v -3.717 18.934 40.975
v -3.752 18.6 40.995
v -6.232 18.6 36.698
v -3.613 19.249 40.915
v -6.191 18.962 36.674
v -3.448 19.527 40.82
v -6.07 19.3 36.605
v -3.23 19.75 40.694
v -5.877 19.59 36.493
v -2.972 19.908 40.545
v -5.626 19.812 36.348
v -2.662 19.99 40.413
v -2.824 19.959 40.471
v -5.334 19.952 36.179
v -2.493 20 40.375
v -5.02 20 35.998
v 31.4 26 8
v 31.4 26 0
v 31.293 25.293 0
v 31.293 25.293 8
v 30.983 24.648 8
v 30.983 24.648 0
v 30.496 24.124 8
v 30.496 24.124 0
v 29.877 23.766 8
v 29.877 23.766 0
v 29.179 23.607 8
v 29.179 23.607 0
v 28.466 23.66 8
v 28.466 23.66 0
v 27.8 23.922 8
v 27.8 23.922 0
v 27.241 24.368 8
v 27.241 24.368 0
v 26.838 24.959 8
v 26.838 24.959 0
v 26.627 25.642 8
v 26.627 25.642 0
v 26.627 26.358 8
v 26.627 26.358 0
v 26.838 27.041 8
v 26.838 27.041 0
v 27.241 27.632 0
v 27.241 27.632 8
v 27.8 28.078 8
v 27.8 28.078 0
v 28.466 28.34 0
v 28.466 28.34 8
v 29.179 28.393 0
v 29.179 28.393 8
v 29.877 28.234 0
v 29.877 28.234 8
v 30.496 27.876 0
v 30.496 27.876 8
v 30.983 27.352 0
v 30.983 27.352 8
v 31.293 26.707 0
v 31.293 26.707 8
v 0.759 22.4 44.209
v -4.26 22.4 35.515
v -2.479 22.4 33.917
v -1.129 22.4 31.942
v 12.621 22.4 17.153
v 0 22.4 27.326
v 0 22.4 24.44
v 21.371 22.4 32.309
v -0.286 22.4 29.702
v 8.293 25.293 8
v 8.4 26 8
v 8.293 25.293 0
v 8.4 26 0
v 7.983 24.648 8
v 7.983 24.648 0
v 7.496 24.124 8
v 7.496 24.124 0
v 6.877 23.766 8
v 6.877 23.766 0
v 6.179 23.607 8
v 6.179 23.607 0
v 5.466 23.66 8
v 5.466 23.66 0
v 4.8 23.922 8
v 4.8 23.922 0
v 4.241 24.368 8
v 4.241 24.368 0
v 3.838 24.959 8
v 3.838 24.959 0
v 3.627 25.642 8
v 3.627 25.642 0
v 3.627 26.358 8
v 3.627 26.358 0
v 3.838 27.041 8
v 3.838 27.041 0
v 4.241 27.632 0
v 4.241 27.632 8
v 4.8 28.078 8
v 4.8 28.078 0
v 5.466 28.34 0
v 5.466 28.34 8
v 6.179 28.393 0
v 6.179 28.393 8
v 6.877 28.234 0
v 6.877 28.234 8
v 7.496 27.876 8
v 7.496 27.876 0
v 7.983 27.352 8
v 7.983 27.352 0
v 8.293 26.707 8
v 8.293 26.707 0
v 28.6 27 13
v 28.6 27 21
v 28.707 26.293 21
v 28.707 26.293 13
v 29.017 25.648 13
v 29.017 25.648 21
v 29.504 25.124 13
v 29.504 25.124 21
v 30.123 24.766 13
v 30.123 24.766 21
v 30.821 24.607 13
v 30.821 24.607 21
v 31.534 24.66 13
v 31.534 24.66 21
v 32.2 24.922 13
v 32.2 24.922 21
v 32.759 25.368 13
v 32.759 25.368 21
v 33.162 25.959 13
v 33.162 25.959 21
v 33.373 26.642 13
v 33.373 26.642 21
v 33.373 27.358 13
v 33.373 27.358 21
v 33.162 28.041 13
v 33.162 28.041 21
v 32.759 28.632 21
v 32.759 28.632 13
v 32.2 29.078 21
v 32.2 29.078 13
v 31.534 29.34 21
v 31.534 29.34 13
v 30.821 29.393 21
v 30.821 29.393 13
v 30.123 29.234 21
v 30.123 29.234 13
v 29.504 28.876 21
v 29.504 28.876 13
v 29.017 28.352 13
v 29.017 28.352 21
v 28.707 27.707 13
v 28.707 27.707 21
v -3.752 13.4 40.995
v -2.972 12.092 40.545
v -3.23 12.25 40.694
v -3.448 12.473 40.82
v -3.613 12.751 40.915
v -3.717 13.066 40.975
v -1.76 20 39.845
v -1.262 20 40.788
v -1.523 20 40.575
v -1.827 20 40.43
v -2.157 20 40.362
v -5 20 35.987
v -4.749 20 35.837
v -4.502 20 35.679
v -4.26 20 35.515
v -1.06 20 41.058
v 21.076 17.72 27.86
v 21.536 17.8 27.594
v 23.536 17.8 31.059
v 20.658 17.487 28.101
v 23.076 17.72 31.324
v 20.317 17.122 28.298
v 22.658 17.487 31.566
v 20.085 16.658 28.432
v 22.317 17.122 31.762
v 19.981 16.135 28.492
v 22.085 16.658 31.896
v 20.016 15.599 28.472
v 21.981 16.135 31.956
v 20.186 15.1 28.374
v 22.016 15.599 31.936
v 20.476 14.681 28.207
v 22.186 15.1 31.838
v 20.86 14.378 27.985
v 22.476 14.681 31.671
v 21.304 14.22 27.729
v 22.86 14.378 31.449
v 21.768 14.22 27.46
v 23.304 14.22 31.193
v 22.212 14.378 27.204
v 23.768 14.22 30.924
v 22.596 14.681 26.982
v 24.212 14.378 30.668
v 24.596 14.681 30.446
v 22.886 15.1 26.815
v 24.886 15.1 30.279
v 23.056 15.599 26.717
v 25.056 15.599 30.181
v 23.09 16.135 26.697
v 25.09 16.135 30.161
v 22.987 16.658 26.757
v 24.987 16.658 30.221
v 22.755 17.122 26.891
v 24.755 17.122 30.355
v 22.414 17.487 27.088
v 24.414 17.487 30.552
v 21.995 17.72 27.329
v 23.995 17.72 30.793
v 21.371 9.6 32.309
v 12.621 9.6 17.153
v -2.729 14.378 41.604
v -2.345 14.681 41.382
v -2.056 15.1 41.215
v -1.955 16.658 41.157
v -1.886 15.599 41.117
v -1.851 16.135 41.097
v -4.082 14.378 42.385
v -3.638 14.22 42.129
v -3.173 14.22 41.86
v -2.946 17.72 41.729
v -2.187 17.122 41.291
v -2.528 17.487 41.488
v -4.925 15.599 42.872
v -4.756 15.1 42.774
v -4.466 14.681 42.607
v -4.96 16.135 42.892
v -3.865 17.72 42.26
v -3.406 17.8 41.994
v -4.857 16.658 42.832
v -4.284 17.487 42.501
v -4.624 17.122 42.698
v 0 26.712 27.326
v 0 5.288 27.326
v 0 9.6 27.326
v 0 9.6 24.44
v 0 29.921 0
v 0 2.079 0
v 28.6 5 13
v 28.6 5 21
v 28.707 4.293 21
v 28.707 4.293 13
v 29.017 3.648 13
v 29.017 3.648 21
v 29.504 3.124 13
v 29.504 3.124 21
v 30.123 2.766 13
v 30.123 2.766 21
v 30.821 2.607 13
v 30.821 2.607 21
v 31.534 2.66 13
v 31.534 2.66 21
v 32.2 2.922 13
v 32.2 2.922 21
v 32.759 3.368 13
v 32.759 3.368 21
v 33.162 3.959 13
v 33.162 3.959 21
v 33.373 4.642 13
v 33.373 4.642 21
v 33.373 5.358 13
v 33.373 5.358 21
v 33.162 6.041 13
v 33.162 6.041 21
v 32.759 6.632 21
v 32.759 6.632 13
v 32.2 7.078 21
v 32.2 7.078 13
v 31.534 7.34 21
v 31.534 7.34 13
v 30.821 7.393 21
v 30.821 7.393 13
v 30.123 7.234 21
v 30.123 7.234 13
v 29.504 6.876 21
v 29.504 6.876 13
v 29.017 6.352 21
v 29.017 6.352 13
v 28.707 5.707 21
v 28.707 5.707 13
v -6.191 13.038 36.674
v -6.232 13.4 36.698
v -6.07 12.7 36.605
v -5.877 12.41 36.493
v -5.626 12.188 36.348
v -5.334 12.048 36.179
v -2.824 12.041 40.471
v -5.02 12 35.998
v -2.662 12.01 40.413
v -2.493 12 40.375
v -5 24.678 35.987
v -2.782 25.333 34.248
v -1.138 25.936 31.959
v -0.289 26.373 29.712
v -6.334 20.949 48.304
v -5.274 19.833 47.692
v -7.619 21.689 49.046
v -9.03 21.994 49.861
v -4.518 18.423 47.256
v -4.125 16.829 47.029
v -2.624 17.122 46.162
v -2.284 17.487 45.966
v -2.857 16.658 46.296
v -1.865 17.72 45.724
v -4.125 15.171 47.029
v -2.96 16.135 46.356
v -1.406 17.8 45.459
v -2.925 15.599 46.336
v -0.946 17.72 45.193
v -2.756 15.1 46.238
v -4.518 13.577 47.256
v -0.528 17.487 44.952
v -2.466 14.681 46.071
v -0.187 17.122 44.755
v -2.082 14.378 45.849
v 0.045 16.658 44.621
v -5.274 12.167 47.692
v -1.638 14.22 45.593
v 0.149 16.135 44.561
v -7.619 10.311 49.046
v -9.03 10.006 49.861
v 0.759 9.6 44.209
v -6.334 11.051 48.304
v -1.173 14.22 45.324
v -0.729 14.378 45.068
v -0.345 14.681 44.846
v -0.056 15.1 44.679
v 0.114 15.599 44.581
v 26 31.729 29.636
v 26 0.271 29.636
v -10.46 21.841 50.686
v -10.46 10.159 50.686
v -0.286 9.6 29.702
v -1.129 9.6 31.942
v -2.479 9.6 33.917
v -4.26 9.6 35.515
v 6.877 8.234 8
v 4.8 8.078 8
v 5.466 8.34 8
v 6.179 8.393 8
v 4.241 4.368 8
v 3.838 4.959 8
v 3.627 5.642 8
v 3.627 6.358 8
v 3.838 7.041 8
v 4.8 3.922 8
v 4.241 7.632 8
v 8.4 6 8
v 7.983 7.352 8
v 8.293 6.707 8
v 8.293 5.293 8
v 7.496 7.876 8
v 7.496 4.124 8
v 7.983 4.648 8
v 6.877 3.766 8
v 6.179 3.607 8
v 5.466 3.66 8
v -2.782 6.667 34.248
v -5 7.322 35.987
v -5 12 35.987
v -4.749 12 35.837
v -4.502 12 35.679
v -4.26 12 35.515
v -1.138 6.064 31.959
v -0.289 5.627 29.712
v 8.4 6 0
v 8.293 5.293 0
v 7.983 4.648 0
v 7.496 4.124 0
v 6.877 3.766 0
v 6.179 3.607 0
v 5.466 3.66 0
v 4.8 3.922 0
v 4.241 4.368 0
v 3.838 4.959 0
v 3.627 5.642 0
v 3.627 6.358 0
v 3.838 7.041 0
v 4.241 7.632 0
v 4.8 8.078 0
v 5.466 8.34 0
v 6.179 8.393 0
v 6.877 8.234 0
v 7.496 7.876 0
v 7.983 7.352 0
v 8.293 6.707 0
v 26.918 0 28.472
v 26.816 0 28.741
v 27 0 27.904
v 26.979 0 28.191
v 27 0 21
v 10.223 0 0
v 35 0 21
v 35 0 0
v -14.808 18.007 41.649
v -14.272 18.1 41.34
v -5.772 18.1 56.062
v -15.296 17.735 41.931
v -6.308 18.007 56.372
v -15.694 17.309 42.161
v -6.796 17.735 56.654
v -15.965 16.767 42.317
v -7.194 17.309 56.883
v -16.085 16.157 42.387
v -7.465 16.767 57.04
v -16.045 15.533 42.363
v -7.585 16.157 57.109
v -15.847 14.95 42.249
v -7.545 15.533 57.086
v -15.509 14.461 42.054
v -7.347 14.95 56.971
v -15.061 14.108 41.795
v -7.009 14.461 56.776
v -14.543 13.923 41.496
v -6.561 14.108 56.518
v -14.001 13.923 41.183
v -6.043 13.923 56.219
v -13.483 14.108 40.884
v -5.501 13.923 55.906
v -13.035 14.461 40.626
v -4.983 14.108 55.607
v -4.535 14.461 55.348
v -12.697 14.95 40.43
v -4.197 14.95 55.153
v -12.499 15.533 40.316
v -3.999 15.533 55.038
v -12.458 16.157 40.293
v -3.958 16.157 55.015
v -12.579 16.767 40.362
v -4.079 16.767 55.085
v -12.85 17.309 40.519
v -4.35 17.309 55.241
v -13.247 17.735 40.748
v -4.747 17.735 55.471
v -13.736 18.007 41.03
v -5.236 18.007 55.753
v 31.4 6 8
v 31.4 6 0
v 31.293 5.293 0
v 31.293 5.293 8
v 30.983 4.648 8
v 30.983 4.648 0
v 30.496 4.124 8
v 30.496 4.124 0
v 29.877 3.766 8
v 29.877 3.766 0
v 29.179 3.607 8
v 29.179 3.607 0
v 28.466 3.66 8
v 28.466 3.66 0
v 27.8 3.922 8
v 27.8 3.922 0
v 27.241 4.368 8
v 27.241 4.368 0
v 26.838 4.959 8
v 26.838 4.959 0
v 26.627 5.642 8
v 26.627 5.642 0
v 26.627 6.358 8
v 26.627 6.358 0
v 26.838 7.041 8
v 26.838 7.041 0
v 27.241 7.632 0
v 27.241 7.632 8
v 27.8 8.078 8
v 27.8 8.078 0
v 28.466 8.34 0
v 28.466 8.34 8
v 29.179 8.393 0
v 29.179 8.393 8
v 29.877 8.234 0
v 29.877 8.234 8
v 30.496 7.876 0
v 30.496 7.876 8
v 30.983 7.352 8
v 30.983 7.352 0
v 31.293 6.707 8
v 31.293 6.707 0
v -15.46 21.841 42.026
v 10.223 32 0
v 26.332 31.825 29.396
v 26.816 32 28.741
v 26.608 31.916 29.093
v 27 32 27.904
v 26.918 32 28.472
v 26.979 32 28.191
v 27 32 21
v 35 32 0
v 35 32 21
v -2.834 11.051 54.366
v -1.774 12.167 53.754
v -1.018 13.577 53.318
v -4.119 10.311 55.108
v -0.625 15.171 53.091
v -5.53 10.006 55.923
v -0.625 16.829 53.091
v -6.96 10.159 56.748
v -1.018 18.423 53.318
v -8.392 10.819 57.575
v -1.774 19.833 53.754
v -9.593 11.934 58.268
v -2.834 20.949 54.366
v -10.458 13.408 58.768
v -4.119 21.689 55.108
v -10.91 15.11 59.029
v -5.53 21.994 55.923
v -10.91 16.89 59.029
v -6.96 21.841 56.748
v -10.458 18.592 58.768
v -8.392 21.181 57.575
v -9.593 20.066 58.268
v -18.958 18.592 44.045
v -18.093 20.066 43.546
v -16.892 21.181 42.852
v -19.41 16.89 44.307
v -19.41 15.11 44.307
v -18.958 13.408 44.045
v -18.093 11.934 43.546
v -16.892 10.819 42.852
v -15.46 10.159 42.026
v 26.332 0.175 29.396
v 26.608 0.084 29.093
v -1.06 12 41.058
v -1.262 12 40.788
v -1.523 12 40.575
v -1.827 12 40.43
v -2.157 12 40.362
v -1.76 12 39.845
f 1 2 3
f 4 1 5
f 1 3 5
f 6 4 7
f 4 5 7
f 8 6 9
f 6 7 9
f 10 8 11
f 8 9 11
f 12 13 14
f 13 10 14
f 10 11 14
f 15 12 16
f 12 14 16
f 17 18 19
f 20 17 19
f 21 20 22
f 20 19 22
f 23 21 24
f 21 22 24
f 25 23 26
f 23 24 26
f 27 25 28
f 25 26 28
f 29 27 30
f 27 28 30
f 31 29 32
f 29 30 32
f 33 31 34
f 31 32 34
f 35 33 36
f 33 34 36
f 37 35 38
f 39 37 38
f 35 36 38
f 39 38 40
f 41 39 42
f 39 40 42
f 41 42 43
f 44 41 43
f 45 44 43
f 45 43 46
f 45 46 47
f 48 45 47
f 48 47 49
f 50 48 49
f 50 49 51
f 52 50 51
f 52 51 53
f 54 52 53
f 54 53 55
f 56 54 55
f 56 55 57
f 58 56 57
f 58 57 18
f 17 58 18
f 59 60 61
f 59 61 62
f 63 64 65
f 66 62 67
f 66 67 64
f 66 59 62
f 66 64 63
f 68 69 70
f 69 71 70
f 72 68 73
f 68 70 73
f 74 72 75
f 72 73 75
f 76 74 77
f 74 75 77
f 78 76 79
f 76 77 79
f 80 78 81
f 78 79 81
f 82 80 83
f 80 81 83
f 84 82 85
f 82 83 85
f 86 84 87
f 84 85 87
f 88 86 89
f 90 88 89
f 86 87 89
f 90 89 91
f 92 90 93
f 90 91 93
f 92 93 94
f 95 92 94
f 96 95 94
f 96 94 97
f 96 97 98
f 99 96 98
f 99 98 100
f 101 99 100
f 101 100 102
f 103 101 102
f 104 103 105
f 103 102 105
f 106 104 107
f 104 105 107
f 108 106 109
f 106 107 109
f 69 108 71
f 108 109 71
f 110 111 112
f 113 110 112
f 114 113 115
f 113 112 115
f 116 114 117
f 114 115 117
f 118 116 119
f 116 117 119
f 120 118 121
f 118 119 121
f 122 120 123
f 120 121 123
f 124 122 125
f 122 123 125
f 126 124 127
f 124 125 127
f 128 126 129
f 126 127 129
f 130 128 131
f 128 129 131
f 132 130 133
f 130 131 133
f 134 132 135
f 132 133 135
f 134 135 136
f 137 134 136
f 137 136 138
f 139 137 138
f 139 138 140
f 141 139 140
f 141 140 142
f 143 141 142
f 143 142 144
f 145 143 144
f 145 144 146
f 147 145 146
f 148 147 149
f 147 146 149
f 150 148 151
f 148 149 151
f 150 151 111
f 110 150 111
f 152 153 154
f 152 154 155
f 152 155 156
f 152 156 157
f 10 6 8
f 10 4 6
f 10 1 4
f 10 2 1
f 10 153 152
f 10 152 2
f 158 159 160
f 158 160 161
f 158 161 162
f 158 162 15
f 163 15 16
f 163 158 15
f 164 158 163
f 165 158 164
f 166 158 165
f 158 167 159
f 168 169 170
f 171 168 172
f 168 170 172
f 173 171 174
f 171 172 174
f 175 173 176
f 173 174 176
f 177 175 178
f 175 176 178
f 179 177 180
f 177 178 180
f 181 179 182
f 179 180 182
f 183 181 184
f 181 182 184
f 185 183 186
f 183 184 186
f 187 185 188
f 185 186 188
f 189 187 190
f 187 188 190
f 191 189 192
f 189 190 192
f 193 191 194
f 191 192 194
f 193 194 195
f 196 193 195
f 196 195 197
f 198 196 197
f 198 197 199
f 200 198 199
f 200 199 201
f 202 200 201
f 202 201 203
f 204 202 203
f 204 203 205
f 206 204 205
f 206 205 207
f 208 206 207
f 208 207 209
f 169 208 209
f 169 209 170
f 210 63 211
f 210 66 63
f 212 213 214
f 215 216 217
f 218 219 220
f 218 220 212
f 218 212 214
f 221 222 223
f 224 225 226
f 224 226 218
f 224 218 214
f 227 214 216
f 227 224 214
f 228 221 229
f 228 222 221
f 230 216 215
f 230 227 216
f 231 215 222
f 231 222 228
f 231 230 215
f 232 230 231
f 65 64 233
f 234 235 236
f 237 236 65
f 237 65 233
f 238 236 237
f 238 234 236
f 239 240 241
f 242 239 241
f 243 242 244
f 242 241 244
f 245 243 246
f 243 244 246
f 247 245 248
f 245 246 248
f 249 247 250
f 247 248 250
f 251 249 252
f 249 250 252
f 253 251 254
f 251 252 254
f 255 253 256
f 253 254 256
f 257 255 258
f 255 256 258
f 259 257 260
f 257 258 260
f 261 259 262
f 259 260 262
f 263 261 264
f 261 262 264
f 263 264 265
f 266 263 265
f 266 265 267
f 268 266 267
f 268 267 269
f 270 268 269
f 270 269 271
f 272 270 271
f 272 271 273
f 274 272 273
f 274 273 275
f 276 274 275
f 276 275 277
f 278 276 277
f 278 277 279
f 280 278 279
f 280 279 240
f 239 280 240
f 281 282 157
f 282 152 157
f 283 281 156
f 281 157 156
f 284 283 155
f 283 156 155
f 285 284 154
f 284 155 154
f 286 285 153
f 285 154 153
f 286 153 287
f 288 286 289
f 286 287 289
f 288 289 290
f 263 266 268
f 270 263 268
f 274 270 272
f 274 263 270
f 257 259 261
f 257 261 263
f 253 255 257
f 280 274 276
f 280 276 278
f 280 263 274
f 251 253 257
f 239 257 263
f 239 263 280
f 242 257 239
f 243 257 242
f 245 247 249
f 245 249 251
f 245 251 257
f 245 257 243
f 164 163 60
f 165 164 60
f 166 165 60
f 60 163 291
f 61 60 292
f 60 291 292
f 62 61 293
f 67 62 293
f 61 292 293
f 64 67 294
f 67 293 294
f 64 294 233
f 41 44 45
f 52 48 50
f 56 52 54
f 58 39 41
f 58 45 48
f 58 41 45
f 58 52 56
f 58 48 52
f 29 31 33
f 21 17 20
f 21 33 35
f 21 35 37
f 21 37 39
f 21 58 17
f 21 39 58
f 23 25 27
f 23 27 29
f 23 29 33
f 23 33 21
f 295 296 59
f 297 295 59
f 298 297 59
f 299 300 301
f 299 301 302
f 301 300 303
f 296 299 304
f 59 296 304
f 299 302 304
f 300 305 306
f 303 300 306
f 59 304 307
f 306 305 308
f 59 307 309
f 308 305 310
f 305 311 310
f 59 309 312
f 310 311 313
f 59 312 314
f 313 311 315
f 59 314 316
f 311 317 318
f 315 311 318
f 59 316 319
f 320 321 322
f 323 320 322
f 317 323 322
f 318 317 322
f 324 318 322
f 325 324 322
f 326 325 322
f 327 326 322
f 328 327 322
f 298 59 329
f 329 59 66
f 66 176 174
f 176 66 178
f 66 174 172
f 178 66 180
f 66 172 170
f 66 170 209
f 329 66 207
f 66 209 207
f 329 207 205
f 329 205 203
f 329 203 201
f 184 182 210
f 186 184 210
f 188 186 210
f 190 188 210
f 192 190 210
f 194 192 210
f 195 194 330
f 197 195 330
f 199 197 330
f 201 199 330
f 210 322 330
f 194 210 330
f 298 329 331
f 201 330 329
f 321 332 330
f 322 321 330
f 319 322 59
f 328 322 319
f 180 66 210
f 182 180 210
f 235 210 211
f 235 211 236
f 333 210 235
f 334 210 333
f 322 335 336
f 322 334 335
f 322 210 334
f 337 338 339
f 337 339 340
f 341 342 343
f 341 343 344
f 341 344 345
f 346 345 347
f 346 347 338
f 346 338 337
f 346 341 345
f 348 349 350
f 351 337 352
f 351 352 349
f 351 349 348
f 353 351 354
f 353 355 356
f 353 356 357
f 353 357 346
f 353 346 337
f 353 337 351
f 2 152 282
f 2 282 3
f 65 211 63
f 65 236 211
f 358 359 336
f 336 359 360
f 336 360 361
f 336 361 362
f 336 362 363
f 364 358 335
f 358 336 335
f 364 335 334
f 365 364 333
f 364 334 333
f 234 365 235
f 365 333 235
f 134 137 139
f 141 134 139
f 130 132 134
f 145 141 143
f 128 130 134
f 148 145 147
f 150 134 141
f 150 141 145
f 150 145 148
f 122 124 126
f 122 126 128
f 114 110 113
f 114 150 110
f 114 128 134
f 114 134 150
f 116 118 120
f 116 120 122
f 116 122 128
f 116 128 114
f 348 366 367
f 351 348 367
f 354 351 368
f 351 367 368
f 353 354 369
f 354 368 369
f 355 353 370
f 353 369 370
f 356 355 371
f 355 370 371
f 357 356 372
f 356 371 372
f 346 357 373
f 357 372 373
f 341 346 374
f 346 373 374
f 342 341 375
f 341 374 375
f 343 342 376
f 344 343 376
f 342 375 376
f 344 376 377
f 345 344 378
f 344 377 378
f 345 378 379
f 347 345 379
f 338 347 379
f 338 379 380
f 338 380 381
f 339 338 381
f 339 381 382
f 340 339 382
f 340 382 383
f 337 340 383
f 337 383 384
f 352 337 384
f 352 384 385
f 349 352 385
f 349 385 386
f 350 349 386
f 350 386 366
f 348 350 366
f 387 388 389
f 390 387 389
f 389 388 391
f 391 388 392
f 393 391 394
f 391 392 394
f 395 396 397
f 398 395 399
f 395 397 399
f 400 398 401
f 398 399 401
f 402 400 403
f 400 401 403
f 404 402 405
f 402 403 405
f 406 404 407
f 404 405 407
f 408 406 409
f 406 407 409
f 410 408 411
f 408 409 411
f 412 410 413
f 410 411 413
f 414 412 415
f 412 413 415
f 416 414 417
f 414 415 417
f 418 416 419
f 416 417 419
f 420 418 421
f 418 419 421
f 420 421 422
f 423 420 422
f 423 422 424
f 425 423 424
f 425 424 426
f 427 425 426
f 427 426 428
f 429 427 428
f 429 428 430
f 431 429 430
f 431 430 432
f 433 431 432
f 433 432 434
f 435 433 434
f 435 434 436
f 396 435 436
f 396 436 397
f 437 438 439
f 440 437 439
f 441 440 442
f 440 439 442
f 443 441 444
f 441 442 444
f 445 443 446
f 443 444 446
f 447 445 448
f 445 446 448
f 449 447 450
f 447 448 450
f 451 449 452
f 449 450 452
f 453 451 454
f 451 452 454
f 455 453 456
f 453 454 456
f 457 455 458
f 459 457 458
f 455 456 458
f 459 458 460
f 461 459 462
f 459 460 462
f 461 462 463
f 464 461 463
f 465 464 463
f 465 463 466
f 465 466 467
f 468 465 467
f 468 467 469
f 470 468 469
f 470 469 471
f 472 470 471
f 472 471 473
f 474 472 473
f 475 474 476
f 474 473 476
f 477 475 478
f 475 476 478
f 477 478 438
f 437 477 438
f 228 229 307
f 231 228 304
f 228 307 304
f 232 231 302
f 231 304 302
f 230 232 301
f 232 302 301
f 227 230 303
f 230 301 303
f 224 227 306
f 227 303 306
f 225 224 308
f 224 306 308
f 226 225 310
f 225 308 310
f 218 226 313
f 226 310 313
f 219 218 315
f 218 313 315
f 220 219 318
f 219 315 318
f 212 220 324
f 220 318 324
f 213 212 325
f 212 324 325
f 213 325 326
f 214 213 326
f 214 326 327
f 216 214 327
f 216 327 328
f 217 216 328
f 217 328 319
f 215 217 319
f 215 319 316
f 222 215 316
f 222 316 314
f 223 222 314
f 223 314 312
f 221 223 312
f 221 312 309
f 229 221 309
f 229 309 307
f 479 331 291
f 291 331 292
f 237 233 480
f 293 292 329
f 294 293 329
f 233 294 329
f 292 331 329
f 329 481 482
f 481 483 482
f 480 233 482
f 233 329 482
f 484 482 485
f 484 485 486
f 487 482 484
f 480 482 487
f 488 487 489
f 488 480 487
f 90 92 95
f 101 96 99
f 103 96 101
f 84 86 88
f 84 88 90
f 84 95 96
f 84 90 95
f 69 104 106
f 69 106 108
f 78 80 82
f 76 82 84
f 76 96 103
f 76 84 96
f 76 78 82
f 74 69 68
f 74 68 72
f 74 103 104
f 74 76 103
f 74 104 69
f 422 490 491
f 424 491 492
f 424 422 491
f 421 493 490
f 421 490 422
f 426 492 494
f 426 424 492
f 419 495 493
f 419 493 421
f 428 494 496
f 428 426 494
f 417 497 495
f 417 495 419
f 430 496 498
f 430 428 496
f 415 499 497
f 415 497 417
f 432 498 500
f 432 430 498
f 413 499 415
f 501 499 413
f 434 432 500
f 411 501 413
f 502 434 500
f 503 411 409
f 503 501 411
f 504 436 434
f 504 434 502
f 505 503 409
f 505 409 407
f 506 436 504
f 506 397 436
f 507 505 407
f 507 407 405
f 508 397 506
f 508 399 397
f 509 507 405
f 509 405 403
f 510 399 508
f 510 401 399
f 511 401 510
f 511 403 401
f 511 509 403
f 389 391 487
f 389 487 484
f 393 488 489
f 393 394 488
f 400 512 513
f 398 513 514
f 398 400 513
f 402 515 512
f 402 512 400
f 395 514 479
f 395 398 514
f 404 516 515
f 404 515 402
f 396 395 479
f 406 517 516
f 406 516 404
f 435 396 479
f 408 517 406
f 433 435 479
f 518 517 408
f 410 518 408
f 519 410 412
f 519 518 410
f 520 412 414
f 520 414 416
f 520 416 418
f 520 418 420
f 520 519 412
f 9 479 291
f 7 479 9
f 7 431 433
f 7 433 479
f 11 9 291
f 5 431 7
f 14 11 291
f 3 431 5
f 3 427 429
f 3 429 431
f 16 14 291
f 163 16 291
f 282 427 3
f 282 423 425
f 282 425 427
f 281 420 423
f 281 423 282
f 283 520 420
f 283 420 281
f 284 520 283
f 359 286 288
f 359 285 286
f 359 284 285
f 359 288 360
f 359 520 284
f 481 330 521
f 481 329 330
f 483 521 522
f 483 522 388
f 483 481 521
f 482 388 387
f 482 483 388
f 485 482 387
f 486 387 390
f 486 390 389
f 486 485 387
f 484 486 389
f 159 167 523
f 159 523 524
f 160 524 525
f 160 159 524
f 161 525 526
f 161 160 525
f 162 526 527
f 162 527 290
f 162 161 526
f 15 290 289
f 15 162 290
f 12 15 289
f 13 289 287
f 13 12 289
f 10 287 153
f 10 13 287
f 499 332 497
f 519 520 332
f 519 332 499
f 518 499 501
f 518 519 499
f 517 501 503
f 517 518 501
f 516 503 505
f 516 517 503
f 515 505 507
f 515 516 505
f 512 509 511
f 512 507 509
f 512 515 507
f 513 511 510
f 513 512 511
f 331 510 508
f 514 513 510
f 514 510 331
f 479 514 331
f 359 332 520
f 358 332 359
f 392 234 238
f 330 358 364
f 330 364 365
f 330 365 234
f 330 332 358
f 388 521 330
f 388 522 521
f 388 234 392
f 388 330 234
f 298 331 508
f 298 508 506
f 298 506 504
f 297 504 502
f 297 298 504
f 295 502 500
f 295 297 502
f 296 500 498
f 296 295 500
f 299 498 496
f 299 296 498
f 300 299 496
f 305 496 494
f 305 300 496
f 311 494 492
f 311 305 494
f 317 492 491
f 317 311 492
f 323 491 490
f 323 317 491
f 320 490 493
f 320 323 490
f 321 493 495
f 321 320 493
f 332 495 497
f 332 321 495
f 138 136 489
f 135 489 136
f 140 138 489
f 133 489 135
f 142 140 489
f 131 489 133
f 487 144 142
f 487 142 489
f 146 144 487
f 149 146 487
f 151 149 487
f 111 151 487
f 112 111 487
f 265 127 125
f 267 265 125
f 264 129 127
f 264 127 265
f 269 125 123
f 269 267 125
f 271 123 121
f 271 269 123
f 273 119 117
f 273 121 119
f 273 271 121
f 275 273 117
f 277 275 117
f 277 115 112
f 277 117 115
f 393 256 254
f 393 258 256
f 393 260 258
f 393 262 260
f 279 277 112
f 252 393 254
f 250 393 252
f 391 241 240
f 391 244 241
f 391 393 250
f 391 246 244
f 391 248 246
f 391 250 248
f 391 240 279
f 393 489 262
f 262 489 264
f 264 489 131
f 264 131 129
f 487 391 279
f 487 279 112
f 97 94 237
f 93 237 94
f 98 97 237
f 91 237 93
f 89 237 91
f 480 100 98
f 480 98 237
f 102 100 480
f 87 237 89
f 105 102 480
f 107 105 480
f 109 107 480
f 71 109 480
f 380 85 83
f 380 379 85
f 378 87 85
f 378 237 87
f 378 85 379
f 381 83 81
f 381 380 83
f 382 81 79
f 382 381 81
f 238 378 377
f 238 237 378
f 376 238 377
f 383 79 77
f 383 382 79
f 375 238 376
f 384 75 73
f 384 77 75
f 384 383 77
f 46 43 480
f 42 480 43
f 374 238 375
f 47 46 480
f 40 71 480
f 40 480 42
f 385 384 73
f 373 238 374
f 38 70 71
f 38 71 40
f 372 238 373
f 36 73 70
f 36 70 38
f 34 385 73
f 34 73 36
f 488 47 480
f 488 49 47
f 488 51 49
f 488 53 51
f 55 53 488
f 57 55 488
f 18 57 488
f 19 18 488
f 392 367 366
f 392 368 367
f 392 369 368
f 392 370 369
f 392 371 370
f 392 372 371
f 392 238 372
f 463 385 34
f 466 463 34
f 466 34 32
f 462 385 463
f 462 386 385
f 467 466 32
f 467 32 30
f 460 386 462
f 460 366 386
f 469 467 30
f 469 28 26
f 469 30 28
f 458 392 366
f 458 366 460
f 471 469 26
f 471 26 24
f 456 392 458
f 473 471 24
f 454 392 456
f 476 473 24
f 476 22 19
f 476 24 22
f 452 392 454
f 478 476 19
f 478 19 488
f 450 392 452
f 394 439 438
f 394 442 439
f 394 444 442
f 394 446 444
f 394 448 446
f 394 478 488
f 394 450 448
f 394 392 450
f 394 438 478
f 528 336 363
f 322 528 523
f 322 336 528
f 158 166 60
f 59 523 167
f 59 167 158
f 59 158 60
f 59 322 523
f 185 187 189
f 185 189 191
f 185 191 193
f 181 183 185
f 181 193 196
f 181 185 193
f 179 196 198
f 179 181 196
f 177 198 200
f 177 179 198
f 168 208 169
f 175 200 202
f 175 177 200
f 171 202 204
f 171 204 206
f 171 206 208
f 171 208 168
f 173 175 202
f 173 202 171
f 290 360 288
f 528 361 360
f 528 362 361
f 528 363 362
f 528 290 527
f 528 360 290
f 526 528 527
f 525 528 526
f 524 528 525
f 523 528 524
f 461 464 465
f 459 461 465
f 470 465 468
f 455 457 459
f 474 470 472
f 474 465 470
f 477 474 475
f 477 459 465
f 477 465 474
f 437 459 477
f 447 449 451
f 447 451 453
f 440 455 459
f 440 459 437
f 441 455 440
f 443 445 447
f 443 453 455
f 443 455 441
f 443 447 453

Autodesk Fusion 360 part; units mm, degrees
sketch "Main" plane through (0, 0, 0) normal (0, 1, 0) x (1, 0, 0)
  line L0 (0, 0) -> (35, 0)
  line L1 (35, 0) -> (35, -21)
  line L2 (-19.4678, -44.3397) -> (-14.4678, -53)
  line L3 (-19.4678, -44.3397) -> (0, -33.1)
  line L4 (0, -33.1) -> (0, 0)
  line L5 (-14.4678, -53) -> (27, -29.0585)
  line L6 (35, -21) -> (27, -21)
  line L7 (27, -21) -> (27, -29.0585)
  dimension "d1" = 35
  dimension "d2" = 21
  dimension "d4" = 10
  dimension "d5" = 60
  dimension "d7" = 53
  dimension "d34" = 33.1
  dimension "d35" = 8
extrude "Extrude1" add sketch "Main" along normal blind 32
sketch "Upper Cut " plane through (19.3327, 0, 33.4853) normal (0.5, 0, 0.866) x (0, 1, 0)
  line L0 (0, 39.0295) -> (0, -8.8534)
  line L1 (32, -8.8534) -> (32, 39.0295)
  line L2 (32, 39.0295) -> (0, 39.0295)
  line L3 (0, -30.3109) -> (32, -30.3109) construction
  line L4 (16, 39.0295) -> (16, -30.3109) construction
  arc A0 (21.8411, 34.4013) -> (10.1589, 34.4013) centre (16, 33.0295) ccw
  line L5 (10.1589, 34.4013) -> (0, -8.8534)
  line L6 (21.8411, 34.4013) -> (32, -8.8534)
  line L7 (0, -8.8534) -> (32, -8.8534)
  dimension "d11" = 6
extrude "Extrude2" cut sketch "Upper Cut " against normal blind 43 contours L0 L2 A0 L5 | L1 L2 A0 L6
sketch "Tube Extension" plane through (19.3327, 0, 33.4853) normal (0.5, 0, 0.866) x (0, 1, 0)
  line L0 (32, -8.8534) -> (21.8411, 34.4013)
  arc A0 (21.8411, 34.4013) -> (10.1589, 34.4013) centre (16, 33.0295) ccw
  line L1 (10.1589, 34.4013) -> (0, -8.8534)
  circle A1 centre (16, 33.0295) radius 6
  line L2 (0, -8.8534) -> (32, -8.8534)
  dimension "d14" = 12
extrude "Extrude3" add sketch "Tube Extension" along normal blind 7 contours A0 A1
sketch "Tube Hole" plane through (22.8327, 0, 39.5474) normal (0.5, 0, 0.866) x (0, 1, 0)
  circle A0 centre (16, 33.0295) radius 6
  circle A1 centre (16, 33.0295) radius 2.1
  dimension "d17" = 4.2
extrude "Extrude4" cut sketch "Tube Hole" against normal up to surface (17 mm away) contours A1
fillet "Fillet1" radius 10 1 edges at (0, 16, 33.1)
sketch "Servo Holes" plane through (19.3327, 0, 33.4853) normal (0.5, 0, 0.866) x (0, 1, 0)
  arc A0 (10.1589, 34.4013) -> (21.8411, 34.4013) centre (16, 33.0295) ccw
  line L0 (10.1589, 34.4013) -> (0, -8.8534)
  line L1 (32, -8.8534) -> (21.8411, 34.4013)
  line L2 (16, 27.0295) -> (16, -8.8534) construction
  line L3 (9.6, 21.4466) -> (22.4, 21.4466)
  line L4 (22.4, 21.4466) -> (22.4, -2.3534)
  line L5 (22.4, -2.3534) -> (9.6, -2.3534)
  line L6 (9.6, -2.3534) -> (9.6, 21.4466)
  circle A1 centre (16, 23.9466) radius 1.8
  circle A2 centre (16, -4.8534) radius 1.8
  line L7 (0, -8.8534) -> (32, -8.8534)
  dimension "d22" = 12.8
  dimension "d23" = 23.8
  dimension "d24" = 6.4
  dimension "d28" = 3.6
  dimension "d29" = 3.6
  dimension "d30" = 28.8
  dimension "d31" = 2.5
  dimension "d36" = 6.5
extrude "Extrude5" cut sketch "Servo Holes" against normal blind 17.5 contours L3 L4 L5 L6
extrude "Extrude6" cut sketch "Servo Holes" against normal blind 4 contours A1 | A2
fillet "Fillet3" radius 2 1 edges at (27, 16, 29.0585)
sketch "Top Plate Holes" plane through (0, 0, 21) normal (0, 0, 1) x (-1, 0, 0)
  line L0 (-27, 0) -> (-35, 0)
  line L1 (-35, 0) -> (-35, -32)
  line L2 (-35, -32) -> (-27, -32)
  line L3 (-27, -32) -> (-27, 0)
  line L4 (-31, -32) -> (-31, 0) construction
  circle A0 centre (-31, -27) radius 2.4
  circle A1 centre (-31, -5) radius 2.4
  dimension "d41" = 4.8
  dimension "d42" = 4.8
  dimension "d44" = 22
  dimension "d45" = 5
extrude "Extrude7" cut sketch "Top Plate Holes" against normal blind 8 contours A0 | A1
sketch "Base Holes" plane through (0, 0, 0) normal (0, 0, -1) x (1, 0, 0)
  line L0 (10.223, 0) -> (0, -2.0793)
  line L1 (0, -2.0793) -> (0, -29.9207)
  line L2 (0, -29.9207) -> (10.223, -32)
  line L3 (10.223, -32) -> (35, -32)
  line L4 (35, -32) -> (35, 0)
  line L5 (35, 0) -> (10.223, 0)
  circle A0 centre (6, -6) radius 2.4
  circle A1 centre (29, -6) radius 2.4
  circle A2 centre (6, -26) radius 2.4
  circle A3 centre (29, -26) radius 2.4
  dimension "d59" = 4.8
  dimension "d61" = 6
  dimension "d62" = 6
  dimension "d65" = 23
  dimension "d66" = -20
extrude "Extrude8" cut sketch "Base Holes" against normal blind 8 contours A0 | A1 | A2 | A3
sketch "Servo Wires " plane through (-18.5733, 0, 10.7233) normal (0.866, 0, -0.5) x (0, 1, 0)
  line L0 (9.6, 28.6269) -> (22.4, 28.6269)
  line L1 (22.4, 28.6269) -> (22.4, 38.6654)
  line L2 (22.4, 38.6654) -> (9.6, 38.6654)
  line L3 (9.6, 38.6654) -> (9.6, 28.6269)
  line L4 (12, 33.6269) -> (20, 33.6269)
  line L5 (20, 33.6269) -> (20, 28.6269)
  line L6 (20, 28.6269) -> (12, 28.6269)
  line L7 (12, 28.6269) -> (12, 33.6269)
  dimension "d93" = 8
  dimension "d94" = 2.4
  dimension "d95" = 5
extrude "Extrude9" cut sketch "Servo Wires " against normal blind 2.3 contours L0 L4 L5 L6 L7
fillet "Fillet4" radius 1.4 3 edges at (-1.7598, 16, 39.8451) (-4.9921, 12, 38.8467) (-4.9921, 20, 38.8467)
